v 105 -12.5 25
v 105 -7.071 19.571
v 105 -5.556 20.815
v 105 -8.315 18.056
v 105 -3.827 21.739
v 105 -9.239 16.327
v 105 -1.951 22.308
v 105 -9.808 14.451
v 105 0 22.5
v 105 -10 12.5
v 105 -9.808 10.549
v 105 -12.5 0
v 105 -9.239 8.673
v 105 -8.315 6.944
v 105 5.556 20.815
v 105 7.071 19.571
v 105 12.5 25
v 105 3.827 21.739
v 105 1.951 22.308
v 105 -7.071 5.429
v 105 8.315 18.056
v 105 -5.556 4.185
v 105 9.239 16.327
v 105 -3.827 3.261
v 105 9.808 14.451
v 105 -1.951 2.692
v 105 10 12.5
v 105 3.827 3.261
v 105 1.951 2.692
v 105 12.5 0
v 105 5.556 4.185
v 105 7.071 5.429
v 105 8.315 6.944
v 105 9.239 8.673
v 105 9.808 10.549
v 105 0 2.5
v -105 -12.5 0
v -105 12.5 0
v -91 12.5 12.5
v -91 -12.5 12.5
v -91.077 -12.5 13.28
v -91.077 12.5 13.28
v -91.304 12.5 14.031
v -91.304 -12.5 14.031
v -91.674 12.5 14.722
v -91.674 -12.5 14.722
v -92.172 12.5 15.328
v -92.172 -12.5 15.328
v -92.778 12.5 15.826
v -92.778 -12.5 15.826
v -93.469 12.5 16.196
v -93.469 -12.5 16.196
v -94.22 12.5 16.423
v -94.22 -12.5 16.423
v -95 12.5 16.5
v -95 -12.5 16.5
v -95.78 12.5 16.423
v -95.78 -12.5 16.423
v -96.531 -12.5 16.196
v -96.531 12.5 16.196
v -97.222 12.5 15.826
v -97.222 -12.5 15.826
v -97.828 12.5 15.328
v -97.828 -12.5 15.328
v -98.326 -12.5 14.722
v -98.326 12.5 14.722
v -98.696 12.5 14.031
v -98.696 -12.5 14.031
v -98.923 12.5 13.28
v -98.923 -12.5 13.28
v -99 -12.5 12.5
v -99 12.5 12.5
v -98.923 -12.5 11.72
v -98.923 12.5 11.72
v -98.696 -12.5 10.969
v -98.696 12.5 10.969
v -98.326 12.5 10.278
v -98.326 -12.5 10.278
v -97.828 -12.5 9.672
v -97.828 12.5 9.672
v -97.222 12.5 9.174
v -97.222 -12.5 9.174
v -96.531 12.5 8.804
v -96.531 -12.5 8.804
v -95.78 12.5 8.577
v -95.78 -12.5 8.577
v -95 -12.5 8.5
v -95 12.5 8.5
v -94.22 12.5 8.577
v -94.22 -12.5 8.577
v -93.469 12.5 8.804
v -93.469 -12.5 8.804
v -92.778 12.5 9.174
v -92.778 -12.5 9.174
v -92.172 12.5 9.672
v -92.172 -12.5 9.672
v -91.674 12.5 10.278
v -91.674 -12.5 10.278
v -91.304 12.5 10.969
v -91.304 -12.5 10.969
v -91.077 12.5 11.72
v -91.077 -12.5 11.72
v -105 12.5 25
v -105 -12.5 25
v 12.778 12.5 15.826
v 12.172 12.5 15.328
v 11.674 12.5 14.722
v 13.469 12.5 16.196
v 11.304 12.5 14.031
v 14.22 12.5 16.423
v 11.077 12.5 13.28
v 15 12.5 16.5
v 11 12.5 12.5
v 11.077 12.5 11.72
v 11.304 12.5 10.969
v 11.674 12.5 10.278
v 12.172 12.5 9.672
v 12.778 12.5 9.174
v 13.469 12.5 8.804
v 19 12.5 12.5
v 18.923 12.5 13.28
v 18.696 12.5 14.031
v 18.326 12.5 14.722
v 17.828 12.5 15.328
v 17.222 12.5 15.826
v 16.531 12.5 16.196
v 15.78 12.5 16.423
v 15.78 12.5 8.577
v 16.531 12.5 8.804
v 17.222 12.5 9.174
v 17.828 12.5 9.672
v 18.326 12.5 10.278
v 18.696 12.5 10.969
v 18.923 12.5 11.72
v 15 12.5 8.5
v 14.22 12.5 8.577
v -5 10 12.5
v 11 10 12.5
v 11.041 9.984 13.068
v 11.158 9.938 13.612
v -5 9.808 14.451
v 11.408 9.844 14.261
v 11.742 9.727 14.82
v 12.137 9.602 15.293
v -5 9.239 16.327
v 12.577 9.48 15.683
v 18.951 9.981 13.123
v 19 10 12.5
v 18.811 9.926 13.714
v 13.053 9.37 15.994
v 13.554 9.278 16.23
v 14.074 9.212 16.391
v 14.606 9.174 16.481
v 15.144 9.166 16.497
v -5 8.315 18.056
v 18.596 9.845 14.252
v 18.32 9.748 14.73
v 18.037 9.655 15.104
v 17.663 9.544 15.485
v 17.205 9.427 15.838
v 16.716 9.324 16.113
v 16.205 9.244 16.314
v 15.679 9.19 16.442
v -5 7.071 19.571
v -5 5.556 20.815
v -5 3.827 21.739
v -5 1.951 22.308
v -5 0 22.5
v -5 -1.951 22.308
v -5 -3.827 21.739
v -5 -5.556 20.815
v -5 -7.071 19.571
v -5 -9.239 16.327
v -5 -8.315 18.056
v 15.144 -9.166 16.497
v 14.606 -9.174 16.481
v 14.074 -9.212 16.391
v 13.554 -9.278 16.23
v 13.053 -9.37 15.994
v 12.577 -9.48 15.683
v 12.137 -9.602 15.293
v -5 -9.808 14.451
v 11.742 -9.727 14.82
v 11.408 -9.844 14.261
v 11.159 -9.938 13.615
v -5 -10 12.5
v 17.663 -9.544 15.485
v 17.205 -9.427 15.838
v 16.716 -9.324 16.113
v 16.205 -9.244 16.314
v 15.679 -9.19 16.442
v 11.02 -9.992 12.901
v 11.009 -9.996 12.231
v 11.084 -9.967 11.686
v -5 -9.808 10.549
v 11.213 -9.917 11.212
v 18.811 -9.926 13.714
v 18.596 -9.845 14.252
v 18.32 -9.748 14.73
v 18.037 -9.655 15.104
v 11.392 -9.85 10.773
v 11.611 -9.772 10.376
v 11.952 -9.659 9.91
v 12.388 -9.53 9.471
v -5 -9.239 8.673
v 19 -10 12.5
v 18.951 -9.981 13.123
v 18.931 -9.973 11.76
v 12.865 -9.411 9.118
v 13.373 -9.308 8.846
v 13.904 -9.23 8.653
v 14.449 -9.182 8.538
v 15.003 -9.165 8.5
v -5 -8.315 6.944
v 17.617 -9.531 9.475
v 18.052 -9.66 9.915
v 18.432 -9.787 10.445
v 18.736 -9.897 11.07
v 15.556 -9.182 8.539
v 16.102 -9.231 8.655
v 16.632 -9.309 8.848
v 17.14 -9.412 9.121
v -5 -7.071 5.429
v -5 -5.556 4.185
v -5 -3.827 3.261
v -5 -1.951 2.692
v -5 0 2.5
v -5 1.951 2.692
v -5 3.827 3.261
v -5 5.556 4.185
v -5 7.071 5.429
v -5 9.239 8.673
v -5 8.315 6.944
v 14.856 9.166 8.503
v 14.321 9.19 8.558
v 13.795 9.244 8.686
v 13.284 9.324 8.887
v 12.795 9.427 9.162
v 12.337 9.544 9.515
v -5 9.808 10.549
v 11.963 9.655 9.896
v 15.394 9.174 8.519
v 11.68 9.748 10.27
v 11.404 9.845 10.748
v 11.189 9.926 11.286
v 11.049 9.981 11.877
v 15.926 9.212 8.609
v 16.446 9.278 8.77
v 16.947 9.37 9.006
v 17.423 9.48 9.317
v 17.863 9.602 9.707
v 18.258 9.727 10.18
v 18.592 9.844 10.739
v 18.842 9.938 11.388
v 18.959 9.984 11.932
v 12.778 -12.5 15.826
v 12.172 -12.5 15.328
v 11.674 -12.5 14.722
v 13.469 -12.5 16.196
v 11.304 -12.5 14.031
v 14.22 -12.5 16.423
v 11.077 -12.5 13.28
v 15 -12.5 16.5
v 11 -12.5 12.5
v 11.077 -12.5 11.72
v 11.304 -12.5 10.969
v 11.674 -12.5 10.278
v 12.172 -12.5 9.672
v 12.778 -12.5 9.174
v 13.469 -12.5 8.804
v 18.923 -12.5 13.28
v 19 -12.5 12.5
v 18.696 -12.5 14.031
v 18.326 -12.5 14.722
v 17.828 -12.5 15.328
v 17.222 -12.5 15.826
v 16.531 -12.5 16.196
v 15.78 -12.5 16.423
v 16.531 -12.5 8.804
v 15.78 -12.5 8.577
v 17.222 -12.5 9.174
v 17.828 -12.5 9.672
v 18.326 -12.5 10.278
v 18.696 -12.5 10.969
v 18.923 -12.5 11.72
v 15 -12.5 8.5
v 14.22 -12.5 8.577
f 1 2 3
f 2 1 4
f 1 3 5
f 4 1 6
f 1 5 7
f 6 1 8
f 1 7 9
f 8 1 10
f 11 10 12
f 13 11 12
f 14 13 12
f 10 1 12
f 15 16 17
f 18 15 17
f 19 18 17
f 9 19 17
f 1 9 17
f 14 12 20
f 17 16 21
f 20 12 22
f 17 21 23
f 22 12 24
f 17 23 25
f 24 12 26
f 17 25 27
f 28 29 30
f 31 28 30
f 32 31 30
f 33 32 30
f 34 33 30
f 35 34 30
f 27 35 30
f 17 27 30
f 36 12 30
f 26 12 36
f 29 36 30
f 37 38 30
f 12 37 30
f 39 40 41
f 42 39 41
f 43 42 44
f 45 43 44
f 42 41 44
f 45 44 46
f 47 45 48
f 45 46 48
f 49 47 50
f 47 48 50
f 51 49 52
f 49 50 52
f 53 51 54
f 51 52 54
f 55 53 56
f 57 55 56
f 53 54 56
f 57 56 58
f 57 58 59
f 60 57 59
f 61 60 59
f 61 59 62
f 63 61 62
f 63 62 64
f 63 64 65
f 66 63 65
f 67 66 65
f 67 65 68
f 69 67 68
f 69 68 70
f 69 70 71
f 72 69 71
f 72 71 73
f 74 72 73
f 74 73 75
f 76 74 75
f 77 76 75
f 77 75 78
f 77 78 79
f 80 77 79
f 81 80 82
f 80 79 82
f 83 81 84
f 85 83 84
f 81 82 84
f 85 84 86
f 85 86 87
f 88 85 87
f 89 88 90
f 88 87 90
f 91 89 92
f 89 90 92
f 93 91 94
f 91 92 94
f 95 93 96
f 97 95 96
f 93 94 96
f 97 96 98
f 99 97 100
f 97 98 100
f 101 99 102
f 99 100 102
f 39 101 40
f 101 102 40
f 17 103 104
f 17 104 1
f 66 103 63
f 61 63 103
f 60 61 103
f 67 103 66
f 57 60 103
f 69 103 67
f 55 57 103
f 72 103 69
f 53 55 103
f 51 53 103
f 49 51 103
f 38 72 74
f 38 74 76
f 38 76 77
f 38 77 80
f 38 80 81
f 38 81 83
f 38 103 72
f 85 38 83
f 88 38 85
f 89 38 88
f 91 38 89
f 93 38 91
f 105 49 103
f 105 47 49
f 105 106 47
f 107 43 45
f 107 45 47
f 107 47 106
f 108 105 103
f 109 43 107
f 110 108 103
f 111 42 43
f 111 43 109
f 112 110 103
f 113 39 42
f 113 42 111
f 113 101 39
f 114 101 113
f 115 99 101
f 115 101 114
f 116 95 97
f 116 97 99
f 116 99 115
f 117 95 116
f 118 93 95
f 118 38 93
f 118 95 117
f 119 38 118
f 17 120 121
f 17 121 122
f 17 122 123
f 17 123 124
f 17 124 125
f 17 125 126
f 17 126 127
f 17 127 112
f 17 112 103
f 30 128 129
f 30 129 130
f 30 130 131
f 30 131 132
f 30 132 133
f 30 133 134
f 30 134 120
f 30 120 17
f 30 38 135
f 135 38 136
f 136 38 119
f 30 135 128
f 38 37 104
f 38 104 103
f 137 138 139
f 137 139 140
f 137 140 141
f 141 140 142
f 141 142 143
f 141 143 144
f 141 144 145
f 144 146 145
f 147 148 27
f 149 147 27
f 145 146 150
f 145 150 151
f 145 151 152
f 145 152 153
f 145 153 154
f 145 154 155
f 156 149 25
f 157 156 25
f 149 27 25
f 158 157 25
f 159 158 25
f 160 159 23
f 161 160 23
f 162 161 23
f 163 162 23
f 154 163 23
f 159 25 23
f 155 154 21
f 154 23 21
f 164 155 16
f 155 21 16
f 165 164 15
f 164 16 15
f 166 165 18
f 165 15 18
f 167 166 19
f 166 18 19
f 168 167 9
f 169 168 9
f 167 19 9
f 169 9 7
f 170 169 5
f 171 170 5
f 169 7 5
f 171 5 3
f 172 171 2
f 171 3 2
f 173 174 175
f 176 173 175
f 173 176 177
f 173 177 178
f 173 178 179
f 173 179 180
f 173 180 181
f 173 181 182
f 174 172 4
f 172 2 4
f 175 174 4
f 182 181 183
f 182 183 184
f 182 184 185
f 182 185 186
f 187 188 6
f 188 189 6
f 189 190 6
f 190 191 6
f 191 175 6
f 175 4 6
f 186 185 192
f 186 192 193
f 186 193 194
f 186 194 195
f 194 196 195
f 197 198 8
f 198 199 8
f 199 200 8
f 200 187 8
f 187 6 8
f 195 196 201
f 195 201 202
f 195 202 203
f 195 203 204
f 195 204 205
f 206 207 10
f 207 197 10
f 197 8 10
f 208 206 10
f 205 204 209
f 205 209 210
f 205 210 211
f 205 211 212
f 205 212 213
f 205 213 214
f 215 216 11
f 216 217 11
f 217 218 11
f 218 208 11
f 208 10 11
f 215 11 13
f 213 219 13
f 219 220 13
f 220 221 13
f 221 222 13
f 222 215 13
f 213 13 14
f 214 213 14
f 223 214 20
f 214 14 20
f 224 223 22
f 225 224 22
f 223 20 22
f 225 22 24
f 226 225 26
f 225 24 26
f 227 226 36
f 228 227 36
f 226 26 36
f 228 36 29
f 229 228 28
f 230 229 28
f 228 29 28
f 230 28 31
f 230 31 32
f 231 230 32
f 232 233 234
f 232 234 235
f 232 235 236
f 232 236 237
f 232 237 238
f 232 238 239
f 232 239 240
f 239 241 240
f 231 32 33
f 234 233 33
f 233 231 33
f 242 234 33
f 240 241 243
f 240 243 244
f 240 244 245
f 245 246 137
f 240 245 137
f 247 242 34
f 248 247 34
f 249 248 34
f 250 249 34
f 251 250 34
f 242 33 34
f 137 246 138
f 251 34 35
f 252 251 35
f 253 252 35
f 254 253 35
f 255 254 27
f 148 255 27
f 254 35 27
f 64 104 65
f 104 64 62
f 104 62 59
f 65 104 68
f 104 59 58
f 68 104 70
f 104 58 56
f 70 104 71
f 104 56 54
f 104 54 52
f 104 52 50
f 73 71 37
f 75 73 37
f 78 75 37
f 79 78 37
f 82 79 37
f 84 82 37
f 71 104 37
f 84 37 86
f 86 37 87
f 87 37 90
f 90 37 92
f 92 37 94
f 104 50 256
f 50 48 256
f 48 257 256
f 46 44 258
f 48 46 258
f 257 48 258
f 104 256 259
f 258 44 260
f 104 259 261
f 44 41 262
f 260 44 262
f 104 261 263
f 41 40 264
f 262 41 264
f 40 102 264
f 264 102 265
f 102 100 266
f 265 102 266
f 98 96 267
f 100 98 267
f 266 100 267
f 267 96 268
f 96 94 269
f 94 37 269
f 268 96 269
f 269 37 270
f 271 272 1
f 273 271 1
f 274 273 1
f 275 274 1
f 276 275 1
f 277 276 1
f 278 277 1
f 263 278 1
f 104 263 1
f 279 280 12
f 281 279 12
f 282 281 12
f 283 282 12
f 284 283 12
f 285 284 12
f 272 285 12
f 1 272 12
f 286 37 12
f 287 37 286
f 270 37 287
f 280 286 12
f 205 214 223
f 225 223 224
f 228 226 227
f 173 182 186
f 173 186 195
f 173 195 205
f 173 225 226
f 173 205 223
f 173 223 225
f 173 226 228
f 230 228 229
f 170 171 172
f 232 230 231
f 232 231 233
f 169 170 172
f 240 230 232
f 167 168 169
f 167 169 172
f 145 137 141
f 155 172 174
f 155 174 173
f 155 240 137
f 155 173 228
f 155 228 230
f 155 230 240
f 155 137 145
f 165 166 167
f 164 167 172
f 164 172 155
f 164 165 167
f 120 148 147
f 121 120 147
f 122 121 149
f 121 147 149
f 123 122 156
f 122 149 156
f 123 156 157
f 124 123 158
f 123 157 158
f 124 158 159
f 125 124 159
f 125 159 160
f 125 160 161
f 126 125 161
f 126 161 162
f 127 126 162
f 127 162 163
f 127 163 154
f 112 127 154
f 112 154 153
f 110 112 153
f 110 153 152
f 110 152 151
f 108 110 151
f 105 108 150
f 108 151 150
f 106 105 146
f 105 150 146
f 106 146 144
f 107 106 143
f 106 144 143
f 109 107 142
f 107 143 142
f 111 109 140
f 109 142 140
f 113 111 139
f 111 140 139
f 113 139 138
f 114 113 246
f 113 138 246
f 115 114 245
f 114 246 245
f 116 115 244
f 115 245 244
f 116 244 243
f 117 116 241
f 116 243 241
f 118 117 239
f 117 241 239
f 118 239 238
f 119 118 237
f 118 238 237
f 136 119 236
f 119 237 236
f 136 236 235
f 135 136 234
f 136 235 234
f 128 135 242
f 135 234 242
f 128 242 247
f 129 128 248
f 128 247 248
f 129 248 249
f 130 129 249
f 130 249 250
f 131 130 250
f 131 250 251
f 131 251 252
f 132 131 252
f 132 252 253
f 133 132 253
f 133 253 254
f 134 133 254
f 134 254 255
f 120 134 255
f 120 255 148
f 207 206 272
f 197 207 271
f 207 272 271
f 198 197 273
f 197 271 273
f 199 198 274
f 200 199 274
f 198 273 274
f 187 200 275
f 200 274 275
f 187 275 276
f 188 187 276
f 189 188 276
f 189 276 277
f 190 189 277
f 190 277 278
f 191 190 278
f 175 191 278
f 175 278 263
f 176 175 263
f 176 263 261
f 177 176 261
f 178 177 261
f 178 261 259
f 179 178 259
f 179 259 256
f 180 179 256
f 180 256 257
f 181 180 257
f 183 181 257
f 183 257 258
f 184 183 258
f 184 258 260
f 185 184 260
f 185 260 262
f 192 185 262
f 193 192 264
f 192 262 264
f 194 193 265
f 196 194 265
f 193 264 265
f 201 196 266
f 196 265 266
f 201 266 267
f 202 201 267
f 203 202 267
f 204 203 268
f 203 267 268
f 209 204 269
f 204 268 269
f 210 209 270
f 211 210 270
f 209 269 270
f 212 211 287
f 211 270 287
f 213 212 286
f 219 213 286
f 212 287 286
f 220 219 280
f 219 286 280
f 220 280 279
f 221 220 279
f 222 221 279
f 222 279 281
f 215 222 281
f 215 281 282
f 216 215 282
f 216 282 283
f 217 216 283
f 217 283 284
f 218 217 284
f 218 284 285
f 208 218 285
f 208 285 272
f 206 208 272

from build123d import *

# Parameters (mm, degrees)
F0_W     = 210
F0_H     = 25
F1_DEPTH = 25
F2_R     = 4
F3_DEPTH = 25.001
F4_R     = 10
F5_DEPTH = 110


with BuildPart() as f1:
    # F0 (on Top) → F1 (new body)
    with BuildSketch(Plane.XY):
        Rectangle(F0_W, F0_H)
    extrude(amount=F1_DEPTH)

    # F2 (on face) → F3 (cut, through all)
    with BuildSketch(Plane.XZ.offset(12.5)):
        with Locations((-95, 12.5)):
            Circle(F2_R)
        with Locations((15, 12.5)):
            Circle(F2_R)
    extrude(amount=-F3_DEPTH, mode=Mode.SUBTRACT)

    # F4 (on face) → F5 (cut)
    with BuildSketch(Plane.YZ.offset(105)):
        with Locations((0, 12.5)):
            Circle(F4_R)
    extrude(amount=-F5_DEPTH, mode=Mode.SUBTRACT)


solid = f1.part
